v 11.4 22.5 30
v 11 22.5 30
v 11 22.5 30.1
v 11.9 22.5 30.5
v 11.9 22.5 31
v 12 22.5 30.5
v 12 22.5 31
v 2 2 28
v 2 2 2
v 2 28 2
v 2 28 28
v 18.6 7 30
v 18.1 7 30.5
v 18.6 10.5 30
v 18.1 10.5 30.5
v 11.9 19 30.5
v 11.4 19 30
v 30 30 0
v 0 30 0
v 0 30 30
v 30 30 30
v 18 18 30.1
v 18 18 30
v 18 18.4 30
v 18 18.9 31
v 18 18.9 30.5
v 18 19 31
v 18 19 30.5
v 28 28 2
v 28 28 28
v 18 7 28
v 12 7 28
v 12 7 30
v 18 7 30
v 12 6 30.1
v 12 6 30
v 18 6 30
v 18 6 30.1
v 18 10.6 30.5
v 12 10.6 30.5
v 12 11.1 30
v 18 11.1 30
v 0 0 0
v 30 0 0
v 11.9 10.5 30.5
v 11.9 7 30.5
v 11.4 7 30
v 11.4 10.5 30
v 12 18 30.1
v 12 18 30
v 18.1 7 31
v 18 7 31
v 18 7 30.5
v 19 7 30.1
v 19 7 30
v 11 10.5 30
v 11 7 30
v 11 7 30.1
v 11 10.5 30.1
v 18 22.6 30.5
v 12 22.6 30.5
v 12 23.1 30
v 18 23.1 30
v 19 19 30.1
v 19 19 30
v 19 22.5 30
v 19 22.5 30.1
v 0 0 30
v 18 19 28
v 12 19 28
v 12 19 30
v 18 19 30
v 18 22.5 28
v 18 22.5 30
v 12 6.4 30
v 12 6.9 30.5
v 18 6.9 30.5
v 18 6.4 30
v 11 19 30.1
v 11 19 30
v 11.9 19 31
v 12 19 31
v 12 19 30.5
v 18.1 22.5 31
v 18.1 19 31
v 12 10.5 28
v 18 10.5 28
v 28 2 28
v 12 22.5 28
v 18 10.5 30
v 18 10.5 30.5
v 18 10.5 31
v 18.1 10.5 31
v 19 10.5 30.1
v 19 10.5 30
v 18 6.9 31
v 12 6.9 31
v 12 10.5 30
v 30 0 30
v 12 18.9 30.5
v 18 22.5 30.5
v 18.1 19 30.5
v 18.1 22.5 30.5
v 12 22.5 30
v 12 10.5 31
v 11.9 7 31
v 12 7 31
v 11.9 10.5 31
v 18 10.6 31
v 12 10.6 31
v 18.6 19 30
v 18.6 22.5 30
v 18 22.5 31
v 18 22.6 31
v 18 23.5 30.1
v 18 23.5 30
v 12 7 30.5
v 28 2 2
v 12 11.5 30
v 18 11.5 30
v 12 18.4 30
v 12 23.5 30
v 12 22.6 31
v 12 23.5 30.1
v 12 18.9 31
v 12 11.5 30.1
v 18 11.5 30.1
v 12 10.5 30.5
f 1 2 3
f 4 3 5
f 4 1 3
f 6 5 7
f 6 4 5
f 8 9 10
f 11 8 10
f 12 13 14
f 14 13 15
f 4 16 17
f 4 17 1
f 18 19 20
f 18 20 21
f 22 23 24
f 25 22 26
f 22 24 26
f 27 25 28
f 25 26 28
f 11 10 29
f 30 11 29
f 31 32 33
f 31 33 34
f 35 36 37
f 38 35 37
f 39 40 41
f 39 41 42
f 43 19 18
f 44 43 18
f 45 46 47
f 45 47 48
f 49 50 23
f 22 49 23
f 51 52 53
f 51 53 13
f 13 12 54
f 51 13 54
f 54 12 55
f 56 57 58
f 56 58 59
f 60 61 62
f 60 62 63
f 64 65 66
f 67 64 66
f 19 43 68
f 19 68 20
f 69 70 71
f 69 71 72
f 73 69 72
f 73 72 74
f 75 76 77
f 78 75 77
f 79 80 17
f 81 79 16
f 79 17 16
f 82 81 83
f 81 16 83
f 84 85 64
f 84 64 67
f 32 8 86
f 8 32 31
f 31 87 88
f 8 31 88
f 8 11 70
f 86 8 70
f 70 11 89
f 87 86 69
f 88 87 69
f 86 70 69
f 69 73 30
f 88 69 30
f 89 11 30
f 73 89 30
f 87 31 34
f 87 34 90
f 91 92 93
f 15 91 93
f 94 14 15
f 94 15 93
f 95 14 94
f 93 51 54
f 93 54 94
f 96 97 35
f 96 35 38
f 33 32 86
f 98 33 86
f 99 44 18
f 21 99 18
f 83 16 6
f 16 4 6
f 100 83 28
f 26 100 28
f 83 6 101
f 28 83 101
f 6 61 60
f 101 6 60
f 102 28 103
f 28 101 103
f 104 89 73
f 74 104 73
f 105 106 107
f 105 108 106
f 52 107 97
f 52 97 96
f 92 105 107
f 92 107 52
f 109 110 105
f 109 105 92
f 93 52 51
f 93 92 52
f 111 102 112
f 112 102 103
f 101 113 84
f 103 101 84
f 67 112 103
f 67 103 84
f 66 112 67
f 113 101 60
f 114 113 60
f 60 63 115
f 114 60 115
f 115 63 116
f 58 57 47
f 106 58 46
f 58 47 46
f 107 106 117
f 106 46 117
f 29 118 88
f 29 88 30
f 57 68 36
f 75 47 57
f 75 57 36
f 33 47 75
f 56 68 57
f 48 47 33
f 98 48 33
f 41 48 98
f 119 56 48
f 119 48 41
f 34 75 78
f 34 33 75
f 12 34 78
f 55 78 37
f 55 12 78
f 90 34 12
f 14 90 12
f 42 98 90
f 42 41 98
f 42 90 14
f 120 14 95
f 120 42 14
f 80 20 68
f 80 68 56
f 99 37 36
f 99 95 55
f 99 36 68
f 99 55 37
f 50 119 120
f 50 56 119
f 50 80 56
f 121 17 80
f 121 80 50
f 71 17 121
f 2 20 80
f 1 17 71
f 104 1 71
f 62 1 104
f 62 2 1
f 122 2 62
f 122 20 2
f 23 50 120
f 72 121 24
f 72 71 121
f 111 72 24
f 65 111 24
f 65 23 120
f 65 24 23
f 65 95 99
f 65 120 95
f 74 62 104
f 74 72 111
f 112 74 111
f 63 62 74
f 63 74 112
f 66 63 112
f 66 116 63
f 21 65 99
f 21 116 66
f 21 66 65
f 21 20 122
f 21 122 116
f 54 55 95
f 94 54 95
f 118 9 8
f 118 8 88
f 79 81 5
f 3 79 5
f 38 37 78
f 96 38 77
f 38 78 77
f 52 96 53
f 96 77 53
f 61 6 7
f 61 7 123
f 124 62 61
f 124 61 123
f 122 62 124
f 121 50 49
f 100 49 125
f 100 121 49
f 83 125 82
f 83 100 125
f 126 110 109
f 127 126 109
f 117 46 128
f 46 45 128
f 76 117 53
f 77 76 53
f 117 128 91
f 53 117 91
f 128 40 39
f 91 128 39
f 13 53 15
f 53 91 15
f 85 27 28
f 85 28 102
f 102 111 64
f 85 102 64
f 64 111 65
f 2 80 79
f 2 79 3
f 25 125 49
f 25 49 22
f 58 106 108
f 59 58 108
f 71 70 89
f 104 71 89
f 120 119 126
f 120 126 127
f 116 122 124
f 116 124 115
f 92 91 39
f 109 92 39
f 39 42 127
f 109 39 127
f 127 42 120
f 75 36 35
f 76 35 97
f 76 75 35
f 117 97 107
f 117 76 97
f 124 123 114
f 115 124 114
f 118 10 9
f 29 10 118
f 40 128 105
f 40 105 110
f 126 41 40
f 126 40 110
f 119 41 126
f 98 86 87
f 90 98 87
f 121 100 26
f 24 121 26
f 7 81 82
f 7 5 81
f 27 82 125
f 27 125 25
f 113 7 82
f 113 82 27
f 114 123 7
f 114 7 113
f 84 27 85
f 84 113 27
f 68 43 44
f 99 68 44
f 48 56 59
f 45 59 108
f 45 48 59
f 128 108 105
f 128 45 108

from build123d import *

# Parameters (mm, degrees)
BOX034_W        = 6
BOX034_H        = 1
BOX034_DEPTH    = 2
BOX033_W        = 1
BOX033_H        = 3.5
BOX033_DEPTH    = 2
BOX032_W        = 1
BOX032_H        = 3.5
BOX032_DEPTH    = 2
BOX031_W        = 6
BOX031_H        = 3.5
BOX031_DEPTH    = 2
BOX035_W        = 6
BOX035_H        = 1
BOX035_DEPTH    = 2
CHAMFER003_SIZE = 0.9
BOX024_W        = 6
BOX024_H        = 1
BOX024_DEPTH    = 2
BOX023_W        = 1
BOX023_H        = 3.5
BOX023_DEPTH    = 2
BOX022_W        = 1
BOX022_H        = 3.5
BOX022_DEPTH    = 2
BOX017_W        = 6
BOX017_H        = 3.5
BOX017_DEPTH    = 2
BOX025_W        = 6
BOX025_H        = 1
BOX025_DEPTH    = 2
CHAMFER001_SIZE = 0.9
BOX014_W        = 6
BOX014_H        = 3.5
BOX014_DEPTH    = 3
BOX015_W        = 6
BOX015_H        = 3.5
BOX015_DEPTH    = 3
BOX001_W        = 26
BOX001_H        = 26
BOX001_DEPTH    = 26
BOX_W           = 30
BOX_H           = 30
BOX_DEPTH       = 30
BOX029_W        = 6
BOX029_H        = 1
BOX029_DEPTH    = 2
BOX028_W        = 1
BOX028_H        = 3.5
BOX028_DEPTH    = 2
BOX027_W        = 1
BOX027_H        = 3.5
BOX027_DEPTH    = 2
BOX026_W        = 6
BOX026_H        = 3.5
BOX026_DEPTH    = 2
BOX030_W        = 6
BOX030_H        = 1
BOX030_DEPTH    = 2
CHAMFER002_SIZE = 0.9
BOX020_W        = 6
BOX020_H        = 1
BOX020_DEPTH    = 2
BOX019_W        = 1
BOX019_H        = 3.5
BOX019_DEPTH    = 2
BOX018_W        = 1
BOX018_H        = 3.5
BOX018_DEPTH    = 2
BOX016_W        = 6
BOX016_H        = 3.5
BOX016_DEPTH    = 2
BOX021_W        = 6
BOX021_H        = 1
BOX021_DEPTH    = 2
CHAMFER_SIZE    = 0.9


with BuildPart() as button2_box0010:
    # Box034 → Box034 (new body)
    with BuildSketch(Plane(origin=(12, 18, 28), x_dir=(1, 0, 0), z_dir=(0, 0, 1))):
        with Locations((3, 0.5)):
            Rectangle(BOX034_W, BOX034_H)
    extrude(amount=BOX034_DEPTH)


with BuildPart() as button2_box0009:
    # Box033 → Box033 (new body)
    with BuildSketch(Plane(origin=(18, 19, 28), x_dir=(1, 0, 0), z_dir=(0, 0, 1))):
        with Locations((0.5, 1.75)):
            Rectangle(BOX033_W, BOX033_H)
    extrude(amount=BOX033_DEPTH)


with BuildPart() as button2_box0008:
    # Box032 → Box032 (new body)
    with BuildSketch(Plane(origin=(11, 19, 28), x_dir=(1, 0, 0), z_dir=(0, 0, 1))):
        with Locations((0.5, 1.75)):
            Rectangle(BOX032_W, BOX032_H)
    extrude(amount=BOX032_DEPTH)


with BuildPart() as button2_box0007:
    # Box031 → Box031 (new body)
    with BuildSketch(Plane(origin=(12, 19, 28), x_dir=(1, 0, 0), z_dir=(0, 0, 1))):
        with Locations((3, 1.75)):
            Rectangle(BOX031_W, BOX031_H)
    extrude(amount=BOX031_DEPTH)


with BuildPart() as chamfer002bt2:
    # Box035 → Box035 (new body)
    with BuildSketch(Plane(origin=(12, 22.5, 28), x_dir=(1, 0, 0), z_dir=(0, 0, 1))):
        with Locations((3, 0.5)):
            Rectangle(BOX035_W, BOX035_H)
    extrude(amount=BOX035_DEPTH)

    # Fusion008: union Button2_box0010, Button2_box0009, Button2_box0008, Button2_box0007
    add(button2_box0010.part)
    add(button2_box0009.part)
    add(button2_box0008.part)
    add(button2_box0007.part)


with BuildPart() as chamfer002bt2_1:
    # Fusion008 placement: moved
    add(chamfer002bt2.part.moved(Location((0, 0, 1))))

    # Chamfer003
    chamfer003_edges = [chamfer002bt2_1.edges().sort_by_distance(p)[0] for p in [
        (11, 20.75, 31),
        (15, 18, 31),
        (15, 23.5, 31),
        (19, 20.75, 31),
    ]]
    chamfer(chamfer003_edges, length=CHAMFER003_SIZE)


with BuildPart() as chamfer002bt2_2:
    # Chamfer003 placement: moved
    add(chamfer002bt2_1.part.moved(Location((0, 0, -0.5))))


with BuildPart() as button2_box0005:
    # Box024 → Box024 (new body)
    with BuildSketch(Plane(origin=(12, 18, 28), x_dir=(1, 0, 0), z_dir=(0, 0, 1))):
        with Locations((3, 0.5)):
            Rectangle(BOX024_W, BOX024_H)
    extrude(amount=BOX024_DEPTH)


with BuildPart() as button2_box0004:
    # Box023 → Box023 (new body)
    with BuildSketch(Plane(origin=(18, 19, 28), x_dir=(1, 0, 0), z_dir=(0, 0, 1))):
        with Locations((0.5, 1.75)):
            Rectangle(BOX023_W, BOX023_H)
    extrude(amount=BOX023_DEPTH)


with BuildPart() as button2_box0003:
    # Box022 → Box022 (new body)
    with BuildSketch(Plane(origin=(11, 19, 28), x_dir=(1, 0, 0), z_dir=(0, 0, 1))):
        with Locations((0.5, 1.75)):
            Rectangle(BOX022_W, BOX022_H)
    extrude(amount=BOX022_DEPTH)


with BuildPart() as button2_box0002:
    # Box017 → Box017 (new body)
    with BuildSketch(Plane(origin=(12, 19, 28), x_dir=(1, 0, 0), z_dir=(0, 0, 1))):
        with Locations((3, 1.75)):
            Rectangle(BOX017_W, BOX017_H)
    extrude(amount=BOX017_DEPTH)


with BuildPart() as cut003:
    # Box025 → Box025 (new body)
    with BuildSketch(Plane(origin=(12, 22.5, 28), x_dir=(1, 0, 0), z_dir=(0, 0, 1))):
        with Locations((3, 0.5)):
            Rectangle(BOX025_W, BOX025_H)
    extrude(amount=BOX025_DEPTH)

    # Fusion003: union Button2_box0005, Button2_box0004, Button2_box0003, Button2_box0002
    add(button2_box0005.part)
    add(button2_box0004.part)
    add(button2_box0003.part)
    add(button2_box0002.part)


with BuildPart() as cut003_1:
    # Fusion003 placement: moved
    add(cut003.part.moved(Location((0, 0, 1))))

    # Chamfer001
    chamfer001_edges = [cut003_1.edges().sort_by_distance(p)[0] for p in [
        (11, 20.75, 31),
        (15, 18, 31),
        (15, 23.5, 31),
        (19, 20.75, 31),
    ]]
    chamfer(chamfer001_edges, length=CHAMFER001_SIZE)

    # Cut003: cut Chamfer002Bt2
    add(chamfer002bt2_2.part, mode=Mode.SUBTRACT)


with BuildPart() as button1_box0001:
    # Box014 → Box014 (new body)
    with BuildSketch(Plane(origin=(12, 7, 27), x_dir=(1, 0, 0), z_dir=(0, 0, 1))):
        with Locations((3, 1.75)):
            Rectangle(BOX014_W, BOX014_H)
    extrude(amount=BOX014_DEPTH)


with BuildPart() as fusion004_cut:
    # Box015 → Box015 (new body)
    with BuildSketch(Plane(origin=(12, 19, 27), x_dir=(1, 0, 0), z_dir=(0, 0, 1))):
        with Locations((3, 1.75)):
            Rectangle(BOX015_W, BOX015_H)
    extrude(amount=BOX015_DEPTH)

    # Fusion004: union Button1_box0001
    add(button1_box0001.part)


with BuildPart() as box_in:
    # Box001 → Box001 (new body)
    with BuildSketch(Plane(origin=(2, 2, 2), x_dir=(1, 0, 0), z_dir=(0, 0, 1))):
        with Locations((13, 13)):
            Rectangle(BOX001_W, BOX001_H)
    extrude(amount=BOX001_DEPTH)


with BuildPart() as cut001:
    # Box → Box (new body)
    with BuildSketch(Plane.XY):
        with Locations((15, 15)):
            Rectangle(BOX_W, BOX_H)
    extrude(amount=BOX_DEPTH)

    # Cut: cut Box_in
    add(box_in.part, mode=Mode.SUBTRACT)

    # Cut001: cut Fusion004_cut
    add(fusion004_cut.part, mode=Mode.SUBTRACT)


with BuildPart() as button1_box0010:
    # Box029 → Box029 (new body)
    with BuildSketch(Plane(origin=(12, 6, 28), x_dir=(1, 0, 0), z_dir=(0, 0, 1))):
        with Locations((3, 0.5)):
            Rectangle(BOX029_W, BOX029_H)
    extrude(amount=BOX029_DEPTH)


with BuildPart() as button1_box0009:
    # Box028 → Box028 (new body)
    with BuildSketch(Plane(origin=(18, 7, 28), x_dir=(1, 0, 0), z_dir=(0, 0, 1))):
        with Locations((0.5, 1.75)):
            Rectangle(BOX028_W, BOX028_H)
    extrude(amount=BOX028_DEPTH)


with BuildPart() as button1_box0008:
    # Box027 → Box027 (new body)
    with BuildSketch(Plane(origin=(11, 7, 28), x_dir=(1, 0, 0), z_dir=(0, 0, 1))):
        with Locations((0.5, 1.75)):
            Rectangle(BOX027_W, BOX027_H)
    extrude(amount=BOX027_DEPTH)


with BuildPart() as button1_box0007:
    # Box026 → Box026 (new body)
    with BuildSketch(Plane(origin=(12, 7, 28), x_dir=(1, 0, 0), z_dir=(0, 0, 1))):
        with Locations((3, 1.75)):
            Rectangle(BOX026_W, BOX026_H)
    extrude(amount=BOX026_DEPTH)


with BuildPart() as chamfer002bt1:
    # Box030 → Box030 (new body)
    with BuildSketch(Plane(origin=(12, 10.5, 28), x_dir=(1, 0, 0), z_dir=(0, 0, 1))):
        with Locations((3, 0.5)):
            Rectangle(BOX030_W, BOX030_H)
    extrude(amount=BOX030_DEPTH)

    # Fusion007: union Button1_box0010, Button1_box0009, Button1_box0008, Button1_box0007
    add(button1_box0010.part)
    add(button1_box0009.part)
    add(button1_box0008.part)
    add(button1_box0007.part)


with BuildPart() as chamfer002bt1_1:
    # Fusion007 placement: moved
    add(chamfer002bt1.part.moved(Location((0, 0, 1))))

    # Chamfer002
    chamfer002_edges = [chamfer002bt1_1.edges().sort_by_distance(p)[0] for p in [
        (11, 8.75, 31),
        (15, 6, 31),
        (15, 11.5, 31),
        (19, 8.75, 31),
    ]]
    chamfer(chamfer002_edges, length=CHAMFER002_SIZE)


with BuildPart() as chamfer002bt1_2:
    # Chamfer002 placement: moved
    add(chamfer002bt1_1.part.moved(Location((0, 0, -0.5))))


with BuildPart() as button1_box0005:
    # Box020 → Box020 (new body)
    with BuildSketch(Plane(origin=(12, 6, 28), x_dir=(1, 0, 0), z_dir=(0, 0, 1))):
        with Locations((3, 0.5)):
            Rectangle(BOX020_W, BOX020_H)
    extrude(amount=BOX020_DEPTH)


with BuildPart() as button1_box0004:
    # Box019 → Box019 (new body)
    with BuildSketch(Plane(origin=(18, 7, 28), x_dir=(1, 0, 0), z_dir=(0, 0, 1))):
        with Locations((0.5, 1.75)):
            Rectangle(BOX019_W, BOX019_H)
    extrude(amount=BOX019_DEPTH)


with BuildPart() as button1_box0003:
    # Box018 → Box018 (new body)
    with BuildSketch(Plane(origin=(11, 7, 28), x_dir=(1, 0, 0), z_dir=(0, 0, 1))):
        with Locations((0.5, 1.75)):
            Rectangle(BOX018_W, BOX018_H)
    extrude(amount=BOX018_DEPTH)


with BuildPart() as button1_box0002:
    # Box016 → Box016 (new body)
    with BuildSketch(Plane(origin=(12, 7, 28), x_dir=(1, 0, 0), z_dir=(0, 0, 1))):
        with Locations((3, 1.75)):
            Rectangle(BOX016_W, BOX016_H)
    extrude(amount=BOX016_DEPTH)


with BuildPart() as box:
    # Box021 → Box021 (new body)
    with BuildSketch(Plane(origin=(12, 10.5, 28), x_dir=(1, 0, 0), z_dir=(0, 0, 1))):
        with Locations((3, 0.5)):
            Rectangle(BOX021_W, BOX021_H)
    extrude(amount=BOX021_DEPTH)

    # Fusion002: union Button1_box0005, Button1_box0004, Button1_box0003, Button1_box0002
    add(button1_box0005.part)
    add(button1_box0004.part)
    add(button1_box0003.part)
    add(button1_box0002.part)


with BuildPart() as box_1:
    # Fusion002 placement: moved
    add(box.part.moved(Location((0, 0, 1))))

    # Chamfer
    chamfer_edges = [box_1.edges().sort_by_distance(p)[0] for p in [
        (11, 8.75, 31),
        (15, 6, 31),
        (15, 11.5, 31),
        (19, 8.75, 31),
    ]]
    chamfer(chamfer_edges, length=CHAMFER_SIZE)

    # Cut002: cut Chamfer002Bt1
    add(chamfer002bt1_2.part, mode=Mode.SUBTRACT)

    # Fusion009: union Cut003, Cut001
    add(cut003_1.part)
    add(cut001.part)


solid = box_1.part
